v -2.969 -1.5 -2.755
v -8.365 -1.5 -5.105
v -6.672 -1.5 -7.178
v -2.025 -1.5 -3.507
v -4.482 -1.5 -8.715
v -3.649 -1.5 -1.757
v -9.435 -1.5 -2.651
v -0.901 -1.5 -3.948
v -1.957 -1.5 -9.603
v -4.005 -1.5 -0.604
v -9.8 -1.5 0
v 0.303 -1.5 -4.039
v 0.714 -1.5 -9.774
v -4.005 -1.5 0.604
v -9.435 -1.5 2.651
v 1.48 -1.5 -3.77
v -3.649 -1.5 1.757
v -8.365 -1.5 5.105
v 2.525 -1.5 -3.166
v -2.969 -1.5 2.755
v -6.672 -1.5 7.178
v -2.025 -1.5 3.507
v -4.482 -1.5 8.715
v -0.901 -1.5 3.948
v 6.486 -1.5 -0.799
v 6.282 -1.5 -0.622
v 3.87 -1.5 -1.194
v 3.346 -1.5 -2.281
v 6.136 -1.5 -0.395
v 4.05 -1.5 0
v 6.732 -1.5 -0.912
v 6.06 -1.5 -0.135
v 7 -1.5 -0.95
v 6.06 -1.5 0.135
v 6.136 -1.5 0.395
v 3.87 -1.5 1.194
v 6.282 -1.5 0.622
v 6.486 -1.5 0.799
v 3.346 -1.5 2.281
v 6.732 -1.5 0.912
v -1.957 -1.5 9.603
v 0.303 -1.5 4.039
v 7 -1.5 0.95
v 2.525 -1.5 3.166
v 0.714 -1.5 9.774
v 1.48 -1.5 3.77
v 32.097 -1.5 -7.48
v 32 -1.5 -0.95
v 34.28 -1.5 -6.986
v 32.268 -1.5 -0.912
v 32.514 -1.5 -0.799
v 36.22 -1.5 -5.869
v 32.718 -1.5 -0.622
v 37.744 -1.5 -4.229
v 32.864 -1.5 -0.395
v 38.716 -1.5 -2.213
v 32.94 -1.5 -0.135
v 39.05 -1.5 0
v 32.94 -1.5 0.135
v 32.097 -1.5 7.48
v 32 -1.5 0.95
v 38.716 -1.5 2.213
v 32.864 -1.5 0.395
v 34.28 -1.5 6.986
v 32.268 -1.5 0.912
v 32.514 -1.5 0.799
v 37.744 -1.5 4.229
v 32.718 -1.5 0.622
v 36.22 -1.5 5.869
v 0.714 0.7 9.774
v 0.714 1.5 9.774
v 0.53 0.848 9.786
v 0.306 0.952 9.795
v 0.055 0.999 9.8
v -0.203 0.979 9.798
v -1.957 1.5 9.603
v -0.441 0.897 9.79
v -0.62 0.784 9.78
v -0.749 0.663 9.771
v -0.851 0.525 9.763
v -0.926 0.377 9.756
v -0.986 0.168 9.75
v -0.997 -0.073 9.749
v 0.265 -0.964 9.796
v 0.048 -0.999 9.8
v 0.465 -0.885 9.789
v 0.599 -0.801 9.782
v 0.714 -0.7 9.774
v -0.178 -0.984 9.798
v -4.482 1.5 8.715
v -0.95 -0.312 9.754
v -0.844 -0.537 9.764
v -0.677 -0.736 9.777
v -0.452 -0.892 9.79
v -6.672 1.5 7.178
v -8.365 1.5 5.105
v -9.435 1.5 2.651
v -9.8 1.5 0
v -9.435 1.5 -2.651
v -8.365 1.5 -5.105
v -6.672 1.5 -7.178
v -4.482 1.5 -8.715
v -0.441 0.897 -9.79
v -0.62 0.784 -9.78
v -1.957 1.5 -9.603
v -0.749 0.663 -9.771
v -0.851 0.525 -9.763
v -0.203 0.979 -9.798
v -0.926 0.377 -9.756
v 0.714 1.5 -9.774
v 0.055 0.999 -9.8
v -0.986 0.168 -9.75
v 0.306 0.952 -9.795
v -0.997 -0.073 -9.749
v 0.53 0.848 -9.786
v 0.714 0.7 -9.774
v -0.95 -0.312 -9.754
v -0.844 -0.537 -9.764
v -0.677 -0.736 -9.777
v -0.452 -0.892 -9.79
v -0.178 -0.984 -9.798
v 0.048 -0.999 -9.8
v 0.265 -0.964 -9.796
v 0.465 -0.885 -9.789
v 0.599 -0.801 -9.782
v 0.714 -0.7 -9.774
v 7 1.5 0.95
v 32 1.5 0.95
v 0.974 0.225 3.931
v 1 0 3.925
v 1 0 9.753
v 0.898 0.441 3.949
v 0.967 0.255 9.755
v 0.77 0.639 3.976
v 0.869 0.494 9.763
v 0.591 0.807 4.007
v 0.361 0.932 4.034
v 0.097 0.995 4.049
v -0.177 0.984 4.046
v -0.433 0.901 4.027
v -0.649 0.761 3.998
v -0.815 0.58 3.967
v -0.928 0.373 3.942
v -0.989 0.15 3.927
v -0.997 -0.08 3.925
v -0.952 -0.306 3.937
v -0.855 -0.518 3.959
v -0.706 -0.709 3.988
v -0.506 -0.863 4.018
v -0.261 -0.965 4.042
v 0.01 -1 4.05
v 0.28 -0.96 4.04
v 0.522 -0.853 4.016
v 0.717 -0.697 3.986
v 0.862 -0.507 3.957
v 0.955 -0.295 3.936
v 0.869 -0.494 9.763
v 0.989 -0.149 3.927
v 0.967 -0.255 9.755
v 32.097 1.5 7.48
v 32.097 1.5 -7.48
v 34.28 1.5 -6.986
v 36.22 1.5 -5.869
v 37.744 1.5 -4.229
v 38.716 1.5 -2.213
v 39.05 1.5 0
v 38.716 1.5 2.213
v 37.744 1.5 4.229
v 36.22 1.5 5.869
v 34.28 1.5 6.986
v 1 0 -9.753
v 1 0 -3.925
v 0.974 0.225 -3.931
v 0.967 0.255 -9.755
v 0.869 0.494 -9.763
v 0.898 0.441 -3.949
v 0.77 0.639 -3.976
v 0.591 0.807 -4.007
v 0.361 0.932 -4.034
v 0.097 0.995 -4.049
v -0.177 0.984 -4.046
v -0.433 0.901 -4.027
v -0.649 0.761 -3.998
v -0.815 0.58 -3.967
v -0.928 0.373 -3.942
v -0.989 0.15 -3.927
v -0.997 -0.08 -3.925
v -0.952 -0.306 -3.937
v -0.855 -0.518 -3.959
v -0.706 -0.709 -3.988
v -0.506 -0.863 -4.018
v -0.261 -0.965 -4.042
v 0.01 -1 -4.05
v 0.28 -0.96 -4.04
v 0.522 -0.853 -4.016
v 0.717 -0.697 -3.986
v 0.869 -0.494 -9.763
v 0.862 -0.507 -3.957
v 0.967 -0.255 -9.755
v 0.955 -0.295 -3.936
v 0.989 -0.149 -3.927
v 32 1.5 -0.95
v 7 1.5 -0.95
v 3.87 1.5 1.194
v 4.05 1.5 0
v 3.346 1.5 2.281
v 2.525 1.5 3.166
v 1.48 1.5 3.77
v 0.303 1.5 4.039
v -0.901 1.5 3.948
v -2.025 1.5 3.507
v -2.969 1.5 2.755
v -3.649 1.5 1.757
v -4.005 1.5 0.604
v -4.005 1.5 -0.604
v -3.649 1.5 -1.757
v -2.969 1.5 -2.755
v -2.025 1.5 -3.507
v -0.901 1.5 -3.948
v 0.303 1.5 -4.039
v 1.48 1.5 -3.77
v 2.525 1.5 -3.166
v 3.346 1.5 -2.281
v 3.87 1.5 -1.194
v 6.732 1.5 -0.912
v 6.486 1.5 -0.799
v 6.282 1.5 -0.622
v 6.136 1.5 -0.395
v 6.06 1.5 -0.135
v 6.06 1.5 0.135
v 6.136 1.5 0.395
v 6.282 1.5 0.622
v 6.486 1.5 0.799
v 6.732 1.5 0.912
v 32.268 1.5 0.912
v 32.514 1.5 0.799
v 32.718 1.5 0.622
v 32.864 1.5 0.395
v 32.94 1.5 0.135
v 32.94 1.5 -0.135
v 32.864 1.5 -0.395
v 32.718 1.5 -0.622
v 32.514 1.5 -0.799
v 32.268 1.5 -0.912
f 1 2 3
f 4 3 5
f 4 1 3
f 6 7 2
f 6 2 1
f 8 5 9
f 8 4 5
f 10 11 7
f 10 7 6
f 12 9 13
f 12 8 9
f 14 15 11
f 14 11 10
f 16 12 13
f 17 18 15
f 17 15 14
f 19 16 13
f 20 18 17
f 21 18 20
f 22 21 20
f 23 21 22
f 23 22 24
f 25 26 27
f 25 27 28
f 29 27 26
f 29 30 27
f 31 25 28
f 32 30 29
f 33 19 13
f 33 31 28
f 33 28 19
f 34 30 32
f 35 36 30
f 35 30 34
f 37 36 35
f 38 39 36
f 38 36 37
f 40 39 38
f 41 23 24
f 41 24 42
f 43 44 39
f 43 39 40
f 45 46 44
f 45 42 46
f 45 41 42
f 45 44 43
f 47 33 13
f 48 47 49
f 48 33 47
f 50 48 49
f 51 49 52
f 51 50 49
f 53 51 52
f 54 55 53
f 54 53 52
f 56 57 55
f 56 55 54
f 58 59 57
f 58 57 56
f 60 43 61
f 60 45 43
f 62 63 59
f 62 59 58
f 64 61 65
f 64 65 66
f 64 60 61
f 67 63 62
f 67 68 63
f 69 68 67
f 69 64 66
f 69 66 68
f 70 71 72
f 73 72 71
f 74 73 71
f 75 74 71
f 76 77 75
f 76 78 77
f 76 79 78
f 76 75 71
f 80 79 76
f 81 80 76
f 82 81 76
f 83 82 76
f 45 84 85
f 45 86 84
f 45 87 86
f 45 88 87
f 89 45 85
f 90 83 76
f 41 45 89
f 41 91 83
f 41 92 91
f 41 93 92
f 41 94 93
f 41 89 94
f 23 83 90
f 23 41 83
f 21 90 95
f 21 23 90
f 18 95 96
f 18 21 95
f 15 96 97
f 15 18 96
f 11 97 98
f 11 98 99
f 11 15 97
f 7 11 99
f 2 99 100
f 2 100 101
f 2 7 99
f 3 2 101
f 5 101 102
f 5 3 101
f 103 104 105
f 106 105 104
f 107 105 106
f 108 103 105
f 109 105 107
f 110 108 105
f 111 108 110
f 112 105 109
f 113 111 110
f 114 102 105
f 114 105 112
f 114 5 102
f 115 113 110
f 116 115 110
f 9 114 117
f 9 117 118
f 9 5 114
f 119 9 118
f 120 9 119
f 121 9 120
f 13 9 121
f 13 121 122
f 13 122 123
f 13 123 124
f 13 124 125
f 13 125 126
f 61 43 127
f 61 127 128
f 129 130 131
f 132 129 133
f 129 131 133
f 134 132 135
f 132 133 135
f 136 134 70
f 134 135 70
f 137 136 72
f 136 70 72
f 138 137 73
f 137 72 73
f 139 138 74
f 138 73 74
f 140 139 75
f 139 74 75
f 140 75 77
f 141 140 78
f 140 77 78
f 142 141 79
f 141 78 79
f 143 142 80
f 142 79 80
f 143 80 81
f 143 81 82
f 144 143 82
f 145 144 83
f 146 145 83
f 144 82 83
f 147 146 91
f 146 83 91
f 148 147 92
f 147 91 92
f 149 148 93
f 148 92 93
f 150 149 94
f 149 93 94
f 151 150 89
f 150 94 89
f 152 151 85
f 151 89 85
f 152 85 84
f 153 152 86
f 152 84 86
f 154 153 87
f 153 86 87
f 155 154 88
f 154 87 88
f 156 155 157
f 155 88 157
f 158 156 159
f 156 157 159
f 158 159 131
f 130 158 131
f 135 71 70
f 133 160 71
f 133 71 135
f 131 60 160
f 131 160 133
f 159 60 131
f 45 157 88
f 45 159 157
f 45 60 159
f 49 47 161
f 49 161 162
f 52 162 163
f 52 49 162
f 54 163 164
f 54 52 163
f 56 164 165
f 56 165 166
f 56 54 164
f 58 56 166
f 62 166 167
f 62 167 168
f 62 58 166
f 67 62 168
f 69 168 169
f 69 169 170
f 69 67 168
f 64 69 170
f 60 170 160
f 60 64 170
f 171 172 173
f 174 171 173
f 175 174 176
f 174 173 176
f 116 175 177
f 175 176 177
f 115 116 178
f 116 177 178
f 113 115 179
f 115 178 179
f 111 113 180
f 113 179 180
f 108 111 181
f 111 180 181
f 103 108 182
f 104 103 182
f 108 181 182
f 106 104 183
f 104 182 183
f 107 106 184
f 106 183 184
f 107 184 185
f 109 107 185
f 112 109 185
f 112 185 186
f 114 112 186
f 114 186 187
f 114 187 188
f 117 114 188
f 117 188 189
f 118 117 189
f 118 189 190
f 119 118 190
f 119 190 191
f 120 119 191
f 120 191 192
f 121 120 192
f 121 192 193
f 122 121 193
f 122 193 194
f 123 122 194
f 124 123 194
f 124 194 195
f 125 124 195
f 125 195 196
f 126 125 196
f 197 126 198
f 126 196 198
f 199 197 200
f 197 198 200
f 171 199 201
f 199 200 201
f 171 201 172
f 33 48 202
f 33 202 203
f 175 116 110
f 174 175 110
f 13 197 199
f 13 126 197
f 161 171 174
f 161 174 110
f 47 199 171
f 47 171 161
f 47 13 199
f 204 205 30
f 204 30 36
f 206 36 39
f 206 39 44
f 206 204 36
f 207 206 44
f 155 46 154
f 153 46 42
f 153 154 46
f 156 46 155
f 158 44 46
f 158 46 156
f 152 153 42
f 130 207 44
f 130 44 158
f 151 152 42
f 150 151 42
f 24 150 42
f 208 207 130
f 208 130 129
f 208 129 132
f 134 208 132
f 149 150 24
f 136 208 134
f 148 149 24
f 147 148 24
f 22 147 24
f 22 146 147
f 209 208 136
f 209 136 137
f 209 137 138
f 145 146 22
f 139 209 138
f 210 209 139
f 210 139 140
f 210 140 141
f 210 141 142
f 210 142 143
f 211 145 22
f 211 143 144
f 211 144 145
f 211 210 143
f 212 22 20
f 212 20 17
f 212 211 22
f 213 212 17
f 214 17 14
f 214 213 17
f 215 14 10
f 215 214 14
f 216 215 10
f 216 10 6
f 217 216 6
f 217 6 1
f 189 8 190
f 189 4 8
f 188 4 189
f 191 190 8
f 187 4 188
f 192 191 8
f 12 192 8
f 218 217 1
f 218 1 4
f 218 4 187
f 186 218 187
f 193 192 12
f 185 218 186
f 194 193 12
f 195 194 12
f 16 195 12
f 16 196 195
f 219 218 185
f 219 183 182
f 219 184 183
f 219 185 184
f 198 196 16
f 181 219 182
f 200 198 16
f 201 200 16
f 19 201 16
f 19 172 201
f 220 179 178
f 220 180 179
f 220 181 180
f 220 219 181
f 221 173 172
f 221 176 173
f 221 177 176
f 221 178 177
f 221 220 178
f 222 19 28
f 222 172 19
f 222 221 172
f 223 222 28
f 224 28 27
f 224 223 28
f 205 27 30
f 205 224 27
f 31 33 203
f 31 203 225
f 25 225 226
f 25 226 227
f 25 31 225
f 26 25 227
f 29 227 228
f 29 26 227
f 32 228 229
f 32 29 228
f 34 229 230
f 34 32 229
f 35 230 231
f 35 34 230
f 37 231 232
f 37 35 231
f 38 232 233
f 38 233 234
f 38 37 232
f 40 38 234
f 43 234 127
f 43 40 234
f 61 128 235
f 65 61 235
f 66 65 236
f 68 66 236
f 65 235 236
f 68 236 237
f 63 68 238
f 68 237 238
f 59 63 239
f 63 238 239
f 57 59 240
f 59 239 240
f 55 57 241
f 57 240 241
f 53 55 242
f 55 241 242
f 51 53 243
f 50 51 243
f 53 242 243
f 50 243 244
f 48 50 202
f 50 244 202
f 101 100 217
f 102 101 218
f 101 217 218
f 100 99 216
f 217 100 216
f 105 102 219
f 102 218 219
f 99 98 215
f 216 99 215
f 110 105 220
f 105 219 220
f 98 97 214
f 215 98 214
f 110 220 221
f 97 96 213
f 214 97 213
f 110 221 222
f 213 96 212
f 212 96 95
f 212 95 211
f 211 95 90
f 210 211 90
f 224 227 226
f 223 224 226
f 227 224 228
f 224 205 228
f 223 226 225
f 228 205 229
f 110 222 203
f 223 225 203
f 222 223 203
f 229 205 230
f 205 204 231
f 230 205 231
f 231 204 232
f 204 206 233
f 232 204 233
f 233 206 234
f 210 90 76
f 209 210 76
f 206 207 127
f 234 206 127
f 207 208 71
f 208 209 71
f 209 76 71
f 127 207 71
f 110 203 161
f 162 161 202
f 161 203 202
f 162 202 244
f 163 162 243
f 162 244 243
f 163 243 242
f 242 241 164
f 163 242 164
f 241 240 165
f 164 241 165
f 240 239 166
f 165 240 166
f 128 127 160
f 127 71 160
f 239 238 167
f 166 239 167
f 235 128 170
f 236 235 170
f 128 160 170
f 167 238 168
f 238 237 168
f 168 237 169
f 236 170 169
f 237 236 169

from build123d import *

# Parameters (mm, degrees)
F0_R     = 4.05
F1_DEPTH = 1.5
F2_R     = 1
F3_DEPTH = 12.5


with BuildPart() as f1:
    # F0 (on Front) → F1 (new body, symmetric)
    with BuildSketch(Plane.XZ):
        with BuildLine():
            Line((0.714422, -9.773925), (32.096751, -7.480044))
            ThreePointArc((32.096751, -7.480044), (39.05, 0), (32.096751, 7.480044))
            Line((32.096751, 7.480044), (0.714422, 9.773925))
            ThreePointArc((0.714422, 9.773925), (-9.8, 0), (0.714422, -9.773925))
        make_face()
        Circle(F0_R, mode=Mode.SUBTRACT)
        with BuildLine():
            ThreePointArc((32, 0.95), (32.95, 0), (32, -0.95))
            Line((32, -0.95), (7, -0.95))
            ThreePointArc((7, -0.95), (6.05, 0), (7, 0.95))
            Line((7, 0.95), (32, 0.95))
        make_face(mode=Mode.SUBTRACT)
    extrude(amount=F1_DEPTH, both=True)

    # F2 (on Top) → F3 (cut, symmetric)
    with BuildSketch(Plane.XY):
        Circle(F2_R)
    extrude(amount=F3_DEPTH, both=True, mode=Mode.SUBTRACT)


solid = f1.part
